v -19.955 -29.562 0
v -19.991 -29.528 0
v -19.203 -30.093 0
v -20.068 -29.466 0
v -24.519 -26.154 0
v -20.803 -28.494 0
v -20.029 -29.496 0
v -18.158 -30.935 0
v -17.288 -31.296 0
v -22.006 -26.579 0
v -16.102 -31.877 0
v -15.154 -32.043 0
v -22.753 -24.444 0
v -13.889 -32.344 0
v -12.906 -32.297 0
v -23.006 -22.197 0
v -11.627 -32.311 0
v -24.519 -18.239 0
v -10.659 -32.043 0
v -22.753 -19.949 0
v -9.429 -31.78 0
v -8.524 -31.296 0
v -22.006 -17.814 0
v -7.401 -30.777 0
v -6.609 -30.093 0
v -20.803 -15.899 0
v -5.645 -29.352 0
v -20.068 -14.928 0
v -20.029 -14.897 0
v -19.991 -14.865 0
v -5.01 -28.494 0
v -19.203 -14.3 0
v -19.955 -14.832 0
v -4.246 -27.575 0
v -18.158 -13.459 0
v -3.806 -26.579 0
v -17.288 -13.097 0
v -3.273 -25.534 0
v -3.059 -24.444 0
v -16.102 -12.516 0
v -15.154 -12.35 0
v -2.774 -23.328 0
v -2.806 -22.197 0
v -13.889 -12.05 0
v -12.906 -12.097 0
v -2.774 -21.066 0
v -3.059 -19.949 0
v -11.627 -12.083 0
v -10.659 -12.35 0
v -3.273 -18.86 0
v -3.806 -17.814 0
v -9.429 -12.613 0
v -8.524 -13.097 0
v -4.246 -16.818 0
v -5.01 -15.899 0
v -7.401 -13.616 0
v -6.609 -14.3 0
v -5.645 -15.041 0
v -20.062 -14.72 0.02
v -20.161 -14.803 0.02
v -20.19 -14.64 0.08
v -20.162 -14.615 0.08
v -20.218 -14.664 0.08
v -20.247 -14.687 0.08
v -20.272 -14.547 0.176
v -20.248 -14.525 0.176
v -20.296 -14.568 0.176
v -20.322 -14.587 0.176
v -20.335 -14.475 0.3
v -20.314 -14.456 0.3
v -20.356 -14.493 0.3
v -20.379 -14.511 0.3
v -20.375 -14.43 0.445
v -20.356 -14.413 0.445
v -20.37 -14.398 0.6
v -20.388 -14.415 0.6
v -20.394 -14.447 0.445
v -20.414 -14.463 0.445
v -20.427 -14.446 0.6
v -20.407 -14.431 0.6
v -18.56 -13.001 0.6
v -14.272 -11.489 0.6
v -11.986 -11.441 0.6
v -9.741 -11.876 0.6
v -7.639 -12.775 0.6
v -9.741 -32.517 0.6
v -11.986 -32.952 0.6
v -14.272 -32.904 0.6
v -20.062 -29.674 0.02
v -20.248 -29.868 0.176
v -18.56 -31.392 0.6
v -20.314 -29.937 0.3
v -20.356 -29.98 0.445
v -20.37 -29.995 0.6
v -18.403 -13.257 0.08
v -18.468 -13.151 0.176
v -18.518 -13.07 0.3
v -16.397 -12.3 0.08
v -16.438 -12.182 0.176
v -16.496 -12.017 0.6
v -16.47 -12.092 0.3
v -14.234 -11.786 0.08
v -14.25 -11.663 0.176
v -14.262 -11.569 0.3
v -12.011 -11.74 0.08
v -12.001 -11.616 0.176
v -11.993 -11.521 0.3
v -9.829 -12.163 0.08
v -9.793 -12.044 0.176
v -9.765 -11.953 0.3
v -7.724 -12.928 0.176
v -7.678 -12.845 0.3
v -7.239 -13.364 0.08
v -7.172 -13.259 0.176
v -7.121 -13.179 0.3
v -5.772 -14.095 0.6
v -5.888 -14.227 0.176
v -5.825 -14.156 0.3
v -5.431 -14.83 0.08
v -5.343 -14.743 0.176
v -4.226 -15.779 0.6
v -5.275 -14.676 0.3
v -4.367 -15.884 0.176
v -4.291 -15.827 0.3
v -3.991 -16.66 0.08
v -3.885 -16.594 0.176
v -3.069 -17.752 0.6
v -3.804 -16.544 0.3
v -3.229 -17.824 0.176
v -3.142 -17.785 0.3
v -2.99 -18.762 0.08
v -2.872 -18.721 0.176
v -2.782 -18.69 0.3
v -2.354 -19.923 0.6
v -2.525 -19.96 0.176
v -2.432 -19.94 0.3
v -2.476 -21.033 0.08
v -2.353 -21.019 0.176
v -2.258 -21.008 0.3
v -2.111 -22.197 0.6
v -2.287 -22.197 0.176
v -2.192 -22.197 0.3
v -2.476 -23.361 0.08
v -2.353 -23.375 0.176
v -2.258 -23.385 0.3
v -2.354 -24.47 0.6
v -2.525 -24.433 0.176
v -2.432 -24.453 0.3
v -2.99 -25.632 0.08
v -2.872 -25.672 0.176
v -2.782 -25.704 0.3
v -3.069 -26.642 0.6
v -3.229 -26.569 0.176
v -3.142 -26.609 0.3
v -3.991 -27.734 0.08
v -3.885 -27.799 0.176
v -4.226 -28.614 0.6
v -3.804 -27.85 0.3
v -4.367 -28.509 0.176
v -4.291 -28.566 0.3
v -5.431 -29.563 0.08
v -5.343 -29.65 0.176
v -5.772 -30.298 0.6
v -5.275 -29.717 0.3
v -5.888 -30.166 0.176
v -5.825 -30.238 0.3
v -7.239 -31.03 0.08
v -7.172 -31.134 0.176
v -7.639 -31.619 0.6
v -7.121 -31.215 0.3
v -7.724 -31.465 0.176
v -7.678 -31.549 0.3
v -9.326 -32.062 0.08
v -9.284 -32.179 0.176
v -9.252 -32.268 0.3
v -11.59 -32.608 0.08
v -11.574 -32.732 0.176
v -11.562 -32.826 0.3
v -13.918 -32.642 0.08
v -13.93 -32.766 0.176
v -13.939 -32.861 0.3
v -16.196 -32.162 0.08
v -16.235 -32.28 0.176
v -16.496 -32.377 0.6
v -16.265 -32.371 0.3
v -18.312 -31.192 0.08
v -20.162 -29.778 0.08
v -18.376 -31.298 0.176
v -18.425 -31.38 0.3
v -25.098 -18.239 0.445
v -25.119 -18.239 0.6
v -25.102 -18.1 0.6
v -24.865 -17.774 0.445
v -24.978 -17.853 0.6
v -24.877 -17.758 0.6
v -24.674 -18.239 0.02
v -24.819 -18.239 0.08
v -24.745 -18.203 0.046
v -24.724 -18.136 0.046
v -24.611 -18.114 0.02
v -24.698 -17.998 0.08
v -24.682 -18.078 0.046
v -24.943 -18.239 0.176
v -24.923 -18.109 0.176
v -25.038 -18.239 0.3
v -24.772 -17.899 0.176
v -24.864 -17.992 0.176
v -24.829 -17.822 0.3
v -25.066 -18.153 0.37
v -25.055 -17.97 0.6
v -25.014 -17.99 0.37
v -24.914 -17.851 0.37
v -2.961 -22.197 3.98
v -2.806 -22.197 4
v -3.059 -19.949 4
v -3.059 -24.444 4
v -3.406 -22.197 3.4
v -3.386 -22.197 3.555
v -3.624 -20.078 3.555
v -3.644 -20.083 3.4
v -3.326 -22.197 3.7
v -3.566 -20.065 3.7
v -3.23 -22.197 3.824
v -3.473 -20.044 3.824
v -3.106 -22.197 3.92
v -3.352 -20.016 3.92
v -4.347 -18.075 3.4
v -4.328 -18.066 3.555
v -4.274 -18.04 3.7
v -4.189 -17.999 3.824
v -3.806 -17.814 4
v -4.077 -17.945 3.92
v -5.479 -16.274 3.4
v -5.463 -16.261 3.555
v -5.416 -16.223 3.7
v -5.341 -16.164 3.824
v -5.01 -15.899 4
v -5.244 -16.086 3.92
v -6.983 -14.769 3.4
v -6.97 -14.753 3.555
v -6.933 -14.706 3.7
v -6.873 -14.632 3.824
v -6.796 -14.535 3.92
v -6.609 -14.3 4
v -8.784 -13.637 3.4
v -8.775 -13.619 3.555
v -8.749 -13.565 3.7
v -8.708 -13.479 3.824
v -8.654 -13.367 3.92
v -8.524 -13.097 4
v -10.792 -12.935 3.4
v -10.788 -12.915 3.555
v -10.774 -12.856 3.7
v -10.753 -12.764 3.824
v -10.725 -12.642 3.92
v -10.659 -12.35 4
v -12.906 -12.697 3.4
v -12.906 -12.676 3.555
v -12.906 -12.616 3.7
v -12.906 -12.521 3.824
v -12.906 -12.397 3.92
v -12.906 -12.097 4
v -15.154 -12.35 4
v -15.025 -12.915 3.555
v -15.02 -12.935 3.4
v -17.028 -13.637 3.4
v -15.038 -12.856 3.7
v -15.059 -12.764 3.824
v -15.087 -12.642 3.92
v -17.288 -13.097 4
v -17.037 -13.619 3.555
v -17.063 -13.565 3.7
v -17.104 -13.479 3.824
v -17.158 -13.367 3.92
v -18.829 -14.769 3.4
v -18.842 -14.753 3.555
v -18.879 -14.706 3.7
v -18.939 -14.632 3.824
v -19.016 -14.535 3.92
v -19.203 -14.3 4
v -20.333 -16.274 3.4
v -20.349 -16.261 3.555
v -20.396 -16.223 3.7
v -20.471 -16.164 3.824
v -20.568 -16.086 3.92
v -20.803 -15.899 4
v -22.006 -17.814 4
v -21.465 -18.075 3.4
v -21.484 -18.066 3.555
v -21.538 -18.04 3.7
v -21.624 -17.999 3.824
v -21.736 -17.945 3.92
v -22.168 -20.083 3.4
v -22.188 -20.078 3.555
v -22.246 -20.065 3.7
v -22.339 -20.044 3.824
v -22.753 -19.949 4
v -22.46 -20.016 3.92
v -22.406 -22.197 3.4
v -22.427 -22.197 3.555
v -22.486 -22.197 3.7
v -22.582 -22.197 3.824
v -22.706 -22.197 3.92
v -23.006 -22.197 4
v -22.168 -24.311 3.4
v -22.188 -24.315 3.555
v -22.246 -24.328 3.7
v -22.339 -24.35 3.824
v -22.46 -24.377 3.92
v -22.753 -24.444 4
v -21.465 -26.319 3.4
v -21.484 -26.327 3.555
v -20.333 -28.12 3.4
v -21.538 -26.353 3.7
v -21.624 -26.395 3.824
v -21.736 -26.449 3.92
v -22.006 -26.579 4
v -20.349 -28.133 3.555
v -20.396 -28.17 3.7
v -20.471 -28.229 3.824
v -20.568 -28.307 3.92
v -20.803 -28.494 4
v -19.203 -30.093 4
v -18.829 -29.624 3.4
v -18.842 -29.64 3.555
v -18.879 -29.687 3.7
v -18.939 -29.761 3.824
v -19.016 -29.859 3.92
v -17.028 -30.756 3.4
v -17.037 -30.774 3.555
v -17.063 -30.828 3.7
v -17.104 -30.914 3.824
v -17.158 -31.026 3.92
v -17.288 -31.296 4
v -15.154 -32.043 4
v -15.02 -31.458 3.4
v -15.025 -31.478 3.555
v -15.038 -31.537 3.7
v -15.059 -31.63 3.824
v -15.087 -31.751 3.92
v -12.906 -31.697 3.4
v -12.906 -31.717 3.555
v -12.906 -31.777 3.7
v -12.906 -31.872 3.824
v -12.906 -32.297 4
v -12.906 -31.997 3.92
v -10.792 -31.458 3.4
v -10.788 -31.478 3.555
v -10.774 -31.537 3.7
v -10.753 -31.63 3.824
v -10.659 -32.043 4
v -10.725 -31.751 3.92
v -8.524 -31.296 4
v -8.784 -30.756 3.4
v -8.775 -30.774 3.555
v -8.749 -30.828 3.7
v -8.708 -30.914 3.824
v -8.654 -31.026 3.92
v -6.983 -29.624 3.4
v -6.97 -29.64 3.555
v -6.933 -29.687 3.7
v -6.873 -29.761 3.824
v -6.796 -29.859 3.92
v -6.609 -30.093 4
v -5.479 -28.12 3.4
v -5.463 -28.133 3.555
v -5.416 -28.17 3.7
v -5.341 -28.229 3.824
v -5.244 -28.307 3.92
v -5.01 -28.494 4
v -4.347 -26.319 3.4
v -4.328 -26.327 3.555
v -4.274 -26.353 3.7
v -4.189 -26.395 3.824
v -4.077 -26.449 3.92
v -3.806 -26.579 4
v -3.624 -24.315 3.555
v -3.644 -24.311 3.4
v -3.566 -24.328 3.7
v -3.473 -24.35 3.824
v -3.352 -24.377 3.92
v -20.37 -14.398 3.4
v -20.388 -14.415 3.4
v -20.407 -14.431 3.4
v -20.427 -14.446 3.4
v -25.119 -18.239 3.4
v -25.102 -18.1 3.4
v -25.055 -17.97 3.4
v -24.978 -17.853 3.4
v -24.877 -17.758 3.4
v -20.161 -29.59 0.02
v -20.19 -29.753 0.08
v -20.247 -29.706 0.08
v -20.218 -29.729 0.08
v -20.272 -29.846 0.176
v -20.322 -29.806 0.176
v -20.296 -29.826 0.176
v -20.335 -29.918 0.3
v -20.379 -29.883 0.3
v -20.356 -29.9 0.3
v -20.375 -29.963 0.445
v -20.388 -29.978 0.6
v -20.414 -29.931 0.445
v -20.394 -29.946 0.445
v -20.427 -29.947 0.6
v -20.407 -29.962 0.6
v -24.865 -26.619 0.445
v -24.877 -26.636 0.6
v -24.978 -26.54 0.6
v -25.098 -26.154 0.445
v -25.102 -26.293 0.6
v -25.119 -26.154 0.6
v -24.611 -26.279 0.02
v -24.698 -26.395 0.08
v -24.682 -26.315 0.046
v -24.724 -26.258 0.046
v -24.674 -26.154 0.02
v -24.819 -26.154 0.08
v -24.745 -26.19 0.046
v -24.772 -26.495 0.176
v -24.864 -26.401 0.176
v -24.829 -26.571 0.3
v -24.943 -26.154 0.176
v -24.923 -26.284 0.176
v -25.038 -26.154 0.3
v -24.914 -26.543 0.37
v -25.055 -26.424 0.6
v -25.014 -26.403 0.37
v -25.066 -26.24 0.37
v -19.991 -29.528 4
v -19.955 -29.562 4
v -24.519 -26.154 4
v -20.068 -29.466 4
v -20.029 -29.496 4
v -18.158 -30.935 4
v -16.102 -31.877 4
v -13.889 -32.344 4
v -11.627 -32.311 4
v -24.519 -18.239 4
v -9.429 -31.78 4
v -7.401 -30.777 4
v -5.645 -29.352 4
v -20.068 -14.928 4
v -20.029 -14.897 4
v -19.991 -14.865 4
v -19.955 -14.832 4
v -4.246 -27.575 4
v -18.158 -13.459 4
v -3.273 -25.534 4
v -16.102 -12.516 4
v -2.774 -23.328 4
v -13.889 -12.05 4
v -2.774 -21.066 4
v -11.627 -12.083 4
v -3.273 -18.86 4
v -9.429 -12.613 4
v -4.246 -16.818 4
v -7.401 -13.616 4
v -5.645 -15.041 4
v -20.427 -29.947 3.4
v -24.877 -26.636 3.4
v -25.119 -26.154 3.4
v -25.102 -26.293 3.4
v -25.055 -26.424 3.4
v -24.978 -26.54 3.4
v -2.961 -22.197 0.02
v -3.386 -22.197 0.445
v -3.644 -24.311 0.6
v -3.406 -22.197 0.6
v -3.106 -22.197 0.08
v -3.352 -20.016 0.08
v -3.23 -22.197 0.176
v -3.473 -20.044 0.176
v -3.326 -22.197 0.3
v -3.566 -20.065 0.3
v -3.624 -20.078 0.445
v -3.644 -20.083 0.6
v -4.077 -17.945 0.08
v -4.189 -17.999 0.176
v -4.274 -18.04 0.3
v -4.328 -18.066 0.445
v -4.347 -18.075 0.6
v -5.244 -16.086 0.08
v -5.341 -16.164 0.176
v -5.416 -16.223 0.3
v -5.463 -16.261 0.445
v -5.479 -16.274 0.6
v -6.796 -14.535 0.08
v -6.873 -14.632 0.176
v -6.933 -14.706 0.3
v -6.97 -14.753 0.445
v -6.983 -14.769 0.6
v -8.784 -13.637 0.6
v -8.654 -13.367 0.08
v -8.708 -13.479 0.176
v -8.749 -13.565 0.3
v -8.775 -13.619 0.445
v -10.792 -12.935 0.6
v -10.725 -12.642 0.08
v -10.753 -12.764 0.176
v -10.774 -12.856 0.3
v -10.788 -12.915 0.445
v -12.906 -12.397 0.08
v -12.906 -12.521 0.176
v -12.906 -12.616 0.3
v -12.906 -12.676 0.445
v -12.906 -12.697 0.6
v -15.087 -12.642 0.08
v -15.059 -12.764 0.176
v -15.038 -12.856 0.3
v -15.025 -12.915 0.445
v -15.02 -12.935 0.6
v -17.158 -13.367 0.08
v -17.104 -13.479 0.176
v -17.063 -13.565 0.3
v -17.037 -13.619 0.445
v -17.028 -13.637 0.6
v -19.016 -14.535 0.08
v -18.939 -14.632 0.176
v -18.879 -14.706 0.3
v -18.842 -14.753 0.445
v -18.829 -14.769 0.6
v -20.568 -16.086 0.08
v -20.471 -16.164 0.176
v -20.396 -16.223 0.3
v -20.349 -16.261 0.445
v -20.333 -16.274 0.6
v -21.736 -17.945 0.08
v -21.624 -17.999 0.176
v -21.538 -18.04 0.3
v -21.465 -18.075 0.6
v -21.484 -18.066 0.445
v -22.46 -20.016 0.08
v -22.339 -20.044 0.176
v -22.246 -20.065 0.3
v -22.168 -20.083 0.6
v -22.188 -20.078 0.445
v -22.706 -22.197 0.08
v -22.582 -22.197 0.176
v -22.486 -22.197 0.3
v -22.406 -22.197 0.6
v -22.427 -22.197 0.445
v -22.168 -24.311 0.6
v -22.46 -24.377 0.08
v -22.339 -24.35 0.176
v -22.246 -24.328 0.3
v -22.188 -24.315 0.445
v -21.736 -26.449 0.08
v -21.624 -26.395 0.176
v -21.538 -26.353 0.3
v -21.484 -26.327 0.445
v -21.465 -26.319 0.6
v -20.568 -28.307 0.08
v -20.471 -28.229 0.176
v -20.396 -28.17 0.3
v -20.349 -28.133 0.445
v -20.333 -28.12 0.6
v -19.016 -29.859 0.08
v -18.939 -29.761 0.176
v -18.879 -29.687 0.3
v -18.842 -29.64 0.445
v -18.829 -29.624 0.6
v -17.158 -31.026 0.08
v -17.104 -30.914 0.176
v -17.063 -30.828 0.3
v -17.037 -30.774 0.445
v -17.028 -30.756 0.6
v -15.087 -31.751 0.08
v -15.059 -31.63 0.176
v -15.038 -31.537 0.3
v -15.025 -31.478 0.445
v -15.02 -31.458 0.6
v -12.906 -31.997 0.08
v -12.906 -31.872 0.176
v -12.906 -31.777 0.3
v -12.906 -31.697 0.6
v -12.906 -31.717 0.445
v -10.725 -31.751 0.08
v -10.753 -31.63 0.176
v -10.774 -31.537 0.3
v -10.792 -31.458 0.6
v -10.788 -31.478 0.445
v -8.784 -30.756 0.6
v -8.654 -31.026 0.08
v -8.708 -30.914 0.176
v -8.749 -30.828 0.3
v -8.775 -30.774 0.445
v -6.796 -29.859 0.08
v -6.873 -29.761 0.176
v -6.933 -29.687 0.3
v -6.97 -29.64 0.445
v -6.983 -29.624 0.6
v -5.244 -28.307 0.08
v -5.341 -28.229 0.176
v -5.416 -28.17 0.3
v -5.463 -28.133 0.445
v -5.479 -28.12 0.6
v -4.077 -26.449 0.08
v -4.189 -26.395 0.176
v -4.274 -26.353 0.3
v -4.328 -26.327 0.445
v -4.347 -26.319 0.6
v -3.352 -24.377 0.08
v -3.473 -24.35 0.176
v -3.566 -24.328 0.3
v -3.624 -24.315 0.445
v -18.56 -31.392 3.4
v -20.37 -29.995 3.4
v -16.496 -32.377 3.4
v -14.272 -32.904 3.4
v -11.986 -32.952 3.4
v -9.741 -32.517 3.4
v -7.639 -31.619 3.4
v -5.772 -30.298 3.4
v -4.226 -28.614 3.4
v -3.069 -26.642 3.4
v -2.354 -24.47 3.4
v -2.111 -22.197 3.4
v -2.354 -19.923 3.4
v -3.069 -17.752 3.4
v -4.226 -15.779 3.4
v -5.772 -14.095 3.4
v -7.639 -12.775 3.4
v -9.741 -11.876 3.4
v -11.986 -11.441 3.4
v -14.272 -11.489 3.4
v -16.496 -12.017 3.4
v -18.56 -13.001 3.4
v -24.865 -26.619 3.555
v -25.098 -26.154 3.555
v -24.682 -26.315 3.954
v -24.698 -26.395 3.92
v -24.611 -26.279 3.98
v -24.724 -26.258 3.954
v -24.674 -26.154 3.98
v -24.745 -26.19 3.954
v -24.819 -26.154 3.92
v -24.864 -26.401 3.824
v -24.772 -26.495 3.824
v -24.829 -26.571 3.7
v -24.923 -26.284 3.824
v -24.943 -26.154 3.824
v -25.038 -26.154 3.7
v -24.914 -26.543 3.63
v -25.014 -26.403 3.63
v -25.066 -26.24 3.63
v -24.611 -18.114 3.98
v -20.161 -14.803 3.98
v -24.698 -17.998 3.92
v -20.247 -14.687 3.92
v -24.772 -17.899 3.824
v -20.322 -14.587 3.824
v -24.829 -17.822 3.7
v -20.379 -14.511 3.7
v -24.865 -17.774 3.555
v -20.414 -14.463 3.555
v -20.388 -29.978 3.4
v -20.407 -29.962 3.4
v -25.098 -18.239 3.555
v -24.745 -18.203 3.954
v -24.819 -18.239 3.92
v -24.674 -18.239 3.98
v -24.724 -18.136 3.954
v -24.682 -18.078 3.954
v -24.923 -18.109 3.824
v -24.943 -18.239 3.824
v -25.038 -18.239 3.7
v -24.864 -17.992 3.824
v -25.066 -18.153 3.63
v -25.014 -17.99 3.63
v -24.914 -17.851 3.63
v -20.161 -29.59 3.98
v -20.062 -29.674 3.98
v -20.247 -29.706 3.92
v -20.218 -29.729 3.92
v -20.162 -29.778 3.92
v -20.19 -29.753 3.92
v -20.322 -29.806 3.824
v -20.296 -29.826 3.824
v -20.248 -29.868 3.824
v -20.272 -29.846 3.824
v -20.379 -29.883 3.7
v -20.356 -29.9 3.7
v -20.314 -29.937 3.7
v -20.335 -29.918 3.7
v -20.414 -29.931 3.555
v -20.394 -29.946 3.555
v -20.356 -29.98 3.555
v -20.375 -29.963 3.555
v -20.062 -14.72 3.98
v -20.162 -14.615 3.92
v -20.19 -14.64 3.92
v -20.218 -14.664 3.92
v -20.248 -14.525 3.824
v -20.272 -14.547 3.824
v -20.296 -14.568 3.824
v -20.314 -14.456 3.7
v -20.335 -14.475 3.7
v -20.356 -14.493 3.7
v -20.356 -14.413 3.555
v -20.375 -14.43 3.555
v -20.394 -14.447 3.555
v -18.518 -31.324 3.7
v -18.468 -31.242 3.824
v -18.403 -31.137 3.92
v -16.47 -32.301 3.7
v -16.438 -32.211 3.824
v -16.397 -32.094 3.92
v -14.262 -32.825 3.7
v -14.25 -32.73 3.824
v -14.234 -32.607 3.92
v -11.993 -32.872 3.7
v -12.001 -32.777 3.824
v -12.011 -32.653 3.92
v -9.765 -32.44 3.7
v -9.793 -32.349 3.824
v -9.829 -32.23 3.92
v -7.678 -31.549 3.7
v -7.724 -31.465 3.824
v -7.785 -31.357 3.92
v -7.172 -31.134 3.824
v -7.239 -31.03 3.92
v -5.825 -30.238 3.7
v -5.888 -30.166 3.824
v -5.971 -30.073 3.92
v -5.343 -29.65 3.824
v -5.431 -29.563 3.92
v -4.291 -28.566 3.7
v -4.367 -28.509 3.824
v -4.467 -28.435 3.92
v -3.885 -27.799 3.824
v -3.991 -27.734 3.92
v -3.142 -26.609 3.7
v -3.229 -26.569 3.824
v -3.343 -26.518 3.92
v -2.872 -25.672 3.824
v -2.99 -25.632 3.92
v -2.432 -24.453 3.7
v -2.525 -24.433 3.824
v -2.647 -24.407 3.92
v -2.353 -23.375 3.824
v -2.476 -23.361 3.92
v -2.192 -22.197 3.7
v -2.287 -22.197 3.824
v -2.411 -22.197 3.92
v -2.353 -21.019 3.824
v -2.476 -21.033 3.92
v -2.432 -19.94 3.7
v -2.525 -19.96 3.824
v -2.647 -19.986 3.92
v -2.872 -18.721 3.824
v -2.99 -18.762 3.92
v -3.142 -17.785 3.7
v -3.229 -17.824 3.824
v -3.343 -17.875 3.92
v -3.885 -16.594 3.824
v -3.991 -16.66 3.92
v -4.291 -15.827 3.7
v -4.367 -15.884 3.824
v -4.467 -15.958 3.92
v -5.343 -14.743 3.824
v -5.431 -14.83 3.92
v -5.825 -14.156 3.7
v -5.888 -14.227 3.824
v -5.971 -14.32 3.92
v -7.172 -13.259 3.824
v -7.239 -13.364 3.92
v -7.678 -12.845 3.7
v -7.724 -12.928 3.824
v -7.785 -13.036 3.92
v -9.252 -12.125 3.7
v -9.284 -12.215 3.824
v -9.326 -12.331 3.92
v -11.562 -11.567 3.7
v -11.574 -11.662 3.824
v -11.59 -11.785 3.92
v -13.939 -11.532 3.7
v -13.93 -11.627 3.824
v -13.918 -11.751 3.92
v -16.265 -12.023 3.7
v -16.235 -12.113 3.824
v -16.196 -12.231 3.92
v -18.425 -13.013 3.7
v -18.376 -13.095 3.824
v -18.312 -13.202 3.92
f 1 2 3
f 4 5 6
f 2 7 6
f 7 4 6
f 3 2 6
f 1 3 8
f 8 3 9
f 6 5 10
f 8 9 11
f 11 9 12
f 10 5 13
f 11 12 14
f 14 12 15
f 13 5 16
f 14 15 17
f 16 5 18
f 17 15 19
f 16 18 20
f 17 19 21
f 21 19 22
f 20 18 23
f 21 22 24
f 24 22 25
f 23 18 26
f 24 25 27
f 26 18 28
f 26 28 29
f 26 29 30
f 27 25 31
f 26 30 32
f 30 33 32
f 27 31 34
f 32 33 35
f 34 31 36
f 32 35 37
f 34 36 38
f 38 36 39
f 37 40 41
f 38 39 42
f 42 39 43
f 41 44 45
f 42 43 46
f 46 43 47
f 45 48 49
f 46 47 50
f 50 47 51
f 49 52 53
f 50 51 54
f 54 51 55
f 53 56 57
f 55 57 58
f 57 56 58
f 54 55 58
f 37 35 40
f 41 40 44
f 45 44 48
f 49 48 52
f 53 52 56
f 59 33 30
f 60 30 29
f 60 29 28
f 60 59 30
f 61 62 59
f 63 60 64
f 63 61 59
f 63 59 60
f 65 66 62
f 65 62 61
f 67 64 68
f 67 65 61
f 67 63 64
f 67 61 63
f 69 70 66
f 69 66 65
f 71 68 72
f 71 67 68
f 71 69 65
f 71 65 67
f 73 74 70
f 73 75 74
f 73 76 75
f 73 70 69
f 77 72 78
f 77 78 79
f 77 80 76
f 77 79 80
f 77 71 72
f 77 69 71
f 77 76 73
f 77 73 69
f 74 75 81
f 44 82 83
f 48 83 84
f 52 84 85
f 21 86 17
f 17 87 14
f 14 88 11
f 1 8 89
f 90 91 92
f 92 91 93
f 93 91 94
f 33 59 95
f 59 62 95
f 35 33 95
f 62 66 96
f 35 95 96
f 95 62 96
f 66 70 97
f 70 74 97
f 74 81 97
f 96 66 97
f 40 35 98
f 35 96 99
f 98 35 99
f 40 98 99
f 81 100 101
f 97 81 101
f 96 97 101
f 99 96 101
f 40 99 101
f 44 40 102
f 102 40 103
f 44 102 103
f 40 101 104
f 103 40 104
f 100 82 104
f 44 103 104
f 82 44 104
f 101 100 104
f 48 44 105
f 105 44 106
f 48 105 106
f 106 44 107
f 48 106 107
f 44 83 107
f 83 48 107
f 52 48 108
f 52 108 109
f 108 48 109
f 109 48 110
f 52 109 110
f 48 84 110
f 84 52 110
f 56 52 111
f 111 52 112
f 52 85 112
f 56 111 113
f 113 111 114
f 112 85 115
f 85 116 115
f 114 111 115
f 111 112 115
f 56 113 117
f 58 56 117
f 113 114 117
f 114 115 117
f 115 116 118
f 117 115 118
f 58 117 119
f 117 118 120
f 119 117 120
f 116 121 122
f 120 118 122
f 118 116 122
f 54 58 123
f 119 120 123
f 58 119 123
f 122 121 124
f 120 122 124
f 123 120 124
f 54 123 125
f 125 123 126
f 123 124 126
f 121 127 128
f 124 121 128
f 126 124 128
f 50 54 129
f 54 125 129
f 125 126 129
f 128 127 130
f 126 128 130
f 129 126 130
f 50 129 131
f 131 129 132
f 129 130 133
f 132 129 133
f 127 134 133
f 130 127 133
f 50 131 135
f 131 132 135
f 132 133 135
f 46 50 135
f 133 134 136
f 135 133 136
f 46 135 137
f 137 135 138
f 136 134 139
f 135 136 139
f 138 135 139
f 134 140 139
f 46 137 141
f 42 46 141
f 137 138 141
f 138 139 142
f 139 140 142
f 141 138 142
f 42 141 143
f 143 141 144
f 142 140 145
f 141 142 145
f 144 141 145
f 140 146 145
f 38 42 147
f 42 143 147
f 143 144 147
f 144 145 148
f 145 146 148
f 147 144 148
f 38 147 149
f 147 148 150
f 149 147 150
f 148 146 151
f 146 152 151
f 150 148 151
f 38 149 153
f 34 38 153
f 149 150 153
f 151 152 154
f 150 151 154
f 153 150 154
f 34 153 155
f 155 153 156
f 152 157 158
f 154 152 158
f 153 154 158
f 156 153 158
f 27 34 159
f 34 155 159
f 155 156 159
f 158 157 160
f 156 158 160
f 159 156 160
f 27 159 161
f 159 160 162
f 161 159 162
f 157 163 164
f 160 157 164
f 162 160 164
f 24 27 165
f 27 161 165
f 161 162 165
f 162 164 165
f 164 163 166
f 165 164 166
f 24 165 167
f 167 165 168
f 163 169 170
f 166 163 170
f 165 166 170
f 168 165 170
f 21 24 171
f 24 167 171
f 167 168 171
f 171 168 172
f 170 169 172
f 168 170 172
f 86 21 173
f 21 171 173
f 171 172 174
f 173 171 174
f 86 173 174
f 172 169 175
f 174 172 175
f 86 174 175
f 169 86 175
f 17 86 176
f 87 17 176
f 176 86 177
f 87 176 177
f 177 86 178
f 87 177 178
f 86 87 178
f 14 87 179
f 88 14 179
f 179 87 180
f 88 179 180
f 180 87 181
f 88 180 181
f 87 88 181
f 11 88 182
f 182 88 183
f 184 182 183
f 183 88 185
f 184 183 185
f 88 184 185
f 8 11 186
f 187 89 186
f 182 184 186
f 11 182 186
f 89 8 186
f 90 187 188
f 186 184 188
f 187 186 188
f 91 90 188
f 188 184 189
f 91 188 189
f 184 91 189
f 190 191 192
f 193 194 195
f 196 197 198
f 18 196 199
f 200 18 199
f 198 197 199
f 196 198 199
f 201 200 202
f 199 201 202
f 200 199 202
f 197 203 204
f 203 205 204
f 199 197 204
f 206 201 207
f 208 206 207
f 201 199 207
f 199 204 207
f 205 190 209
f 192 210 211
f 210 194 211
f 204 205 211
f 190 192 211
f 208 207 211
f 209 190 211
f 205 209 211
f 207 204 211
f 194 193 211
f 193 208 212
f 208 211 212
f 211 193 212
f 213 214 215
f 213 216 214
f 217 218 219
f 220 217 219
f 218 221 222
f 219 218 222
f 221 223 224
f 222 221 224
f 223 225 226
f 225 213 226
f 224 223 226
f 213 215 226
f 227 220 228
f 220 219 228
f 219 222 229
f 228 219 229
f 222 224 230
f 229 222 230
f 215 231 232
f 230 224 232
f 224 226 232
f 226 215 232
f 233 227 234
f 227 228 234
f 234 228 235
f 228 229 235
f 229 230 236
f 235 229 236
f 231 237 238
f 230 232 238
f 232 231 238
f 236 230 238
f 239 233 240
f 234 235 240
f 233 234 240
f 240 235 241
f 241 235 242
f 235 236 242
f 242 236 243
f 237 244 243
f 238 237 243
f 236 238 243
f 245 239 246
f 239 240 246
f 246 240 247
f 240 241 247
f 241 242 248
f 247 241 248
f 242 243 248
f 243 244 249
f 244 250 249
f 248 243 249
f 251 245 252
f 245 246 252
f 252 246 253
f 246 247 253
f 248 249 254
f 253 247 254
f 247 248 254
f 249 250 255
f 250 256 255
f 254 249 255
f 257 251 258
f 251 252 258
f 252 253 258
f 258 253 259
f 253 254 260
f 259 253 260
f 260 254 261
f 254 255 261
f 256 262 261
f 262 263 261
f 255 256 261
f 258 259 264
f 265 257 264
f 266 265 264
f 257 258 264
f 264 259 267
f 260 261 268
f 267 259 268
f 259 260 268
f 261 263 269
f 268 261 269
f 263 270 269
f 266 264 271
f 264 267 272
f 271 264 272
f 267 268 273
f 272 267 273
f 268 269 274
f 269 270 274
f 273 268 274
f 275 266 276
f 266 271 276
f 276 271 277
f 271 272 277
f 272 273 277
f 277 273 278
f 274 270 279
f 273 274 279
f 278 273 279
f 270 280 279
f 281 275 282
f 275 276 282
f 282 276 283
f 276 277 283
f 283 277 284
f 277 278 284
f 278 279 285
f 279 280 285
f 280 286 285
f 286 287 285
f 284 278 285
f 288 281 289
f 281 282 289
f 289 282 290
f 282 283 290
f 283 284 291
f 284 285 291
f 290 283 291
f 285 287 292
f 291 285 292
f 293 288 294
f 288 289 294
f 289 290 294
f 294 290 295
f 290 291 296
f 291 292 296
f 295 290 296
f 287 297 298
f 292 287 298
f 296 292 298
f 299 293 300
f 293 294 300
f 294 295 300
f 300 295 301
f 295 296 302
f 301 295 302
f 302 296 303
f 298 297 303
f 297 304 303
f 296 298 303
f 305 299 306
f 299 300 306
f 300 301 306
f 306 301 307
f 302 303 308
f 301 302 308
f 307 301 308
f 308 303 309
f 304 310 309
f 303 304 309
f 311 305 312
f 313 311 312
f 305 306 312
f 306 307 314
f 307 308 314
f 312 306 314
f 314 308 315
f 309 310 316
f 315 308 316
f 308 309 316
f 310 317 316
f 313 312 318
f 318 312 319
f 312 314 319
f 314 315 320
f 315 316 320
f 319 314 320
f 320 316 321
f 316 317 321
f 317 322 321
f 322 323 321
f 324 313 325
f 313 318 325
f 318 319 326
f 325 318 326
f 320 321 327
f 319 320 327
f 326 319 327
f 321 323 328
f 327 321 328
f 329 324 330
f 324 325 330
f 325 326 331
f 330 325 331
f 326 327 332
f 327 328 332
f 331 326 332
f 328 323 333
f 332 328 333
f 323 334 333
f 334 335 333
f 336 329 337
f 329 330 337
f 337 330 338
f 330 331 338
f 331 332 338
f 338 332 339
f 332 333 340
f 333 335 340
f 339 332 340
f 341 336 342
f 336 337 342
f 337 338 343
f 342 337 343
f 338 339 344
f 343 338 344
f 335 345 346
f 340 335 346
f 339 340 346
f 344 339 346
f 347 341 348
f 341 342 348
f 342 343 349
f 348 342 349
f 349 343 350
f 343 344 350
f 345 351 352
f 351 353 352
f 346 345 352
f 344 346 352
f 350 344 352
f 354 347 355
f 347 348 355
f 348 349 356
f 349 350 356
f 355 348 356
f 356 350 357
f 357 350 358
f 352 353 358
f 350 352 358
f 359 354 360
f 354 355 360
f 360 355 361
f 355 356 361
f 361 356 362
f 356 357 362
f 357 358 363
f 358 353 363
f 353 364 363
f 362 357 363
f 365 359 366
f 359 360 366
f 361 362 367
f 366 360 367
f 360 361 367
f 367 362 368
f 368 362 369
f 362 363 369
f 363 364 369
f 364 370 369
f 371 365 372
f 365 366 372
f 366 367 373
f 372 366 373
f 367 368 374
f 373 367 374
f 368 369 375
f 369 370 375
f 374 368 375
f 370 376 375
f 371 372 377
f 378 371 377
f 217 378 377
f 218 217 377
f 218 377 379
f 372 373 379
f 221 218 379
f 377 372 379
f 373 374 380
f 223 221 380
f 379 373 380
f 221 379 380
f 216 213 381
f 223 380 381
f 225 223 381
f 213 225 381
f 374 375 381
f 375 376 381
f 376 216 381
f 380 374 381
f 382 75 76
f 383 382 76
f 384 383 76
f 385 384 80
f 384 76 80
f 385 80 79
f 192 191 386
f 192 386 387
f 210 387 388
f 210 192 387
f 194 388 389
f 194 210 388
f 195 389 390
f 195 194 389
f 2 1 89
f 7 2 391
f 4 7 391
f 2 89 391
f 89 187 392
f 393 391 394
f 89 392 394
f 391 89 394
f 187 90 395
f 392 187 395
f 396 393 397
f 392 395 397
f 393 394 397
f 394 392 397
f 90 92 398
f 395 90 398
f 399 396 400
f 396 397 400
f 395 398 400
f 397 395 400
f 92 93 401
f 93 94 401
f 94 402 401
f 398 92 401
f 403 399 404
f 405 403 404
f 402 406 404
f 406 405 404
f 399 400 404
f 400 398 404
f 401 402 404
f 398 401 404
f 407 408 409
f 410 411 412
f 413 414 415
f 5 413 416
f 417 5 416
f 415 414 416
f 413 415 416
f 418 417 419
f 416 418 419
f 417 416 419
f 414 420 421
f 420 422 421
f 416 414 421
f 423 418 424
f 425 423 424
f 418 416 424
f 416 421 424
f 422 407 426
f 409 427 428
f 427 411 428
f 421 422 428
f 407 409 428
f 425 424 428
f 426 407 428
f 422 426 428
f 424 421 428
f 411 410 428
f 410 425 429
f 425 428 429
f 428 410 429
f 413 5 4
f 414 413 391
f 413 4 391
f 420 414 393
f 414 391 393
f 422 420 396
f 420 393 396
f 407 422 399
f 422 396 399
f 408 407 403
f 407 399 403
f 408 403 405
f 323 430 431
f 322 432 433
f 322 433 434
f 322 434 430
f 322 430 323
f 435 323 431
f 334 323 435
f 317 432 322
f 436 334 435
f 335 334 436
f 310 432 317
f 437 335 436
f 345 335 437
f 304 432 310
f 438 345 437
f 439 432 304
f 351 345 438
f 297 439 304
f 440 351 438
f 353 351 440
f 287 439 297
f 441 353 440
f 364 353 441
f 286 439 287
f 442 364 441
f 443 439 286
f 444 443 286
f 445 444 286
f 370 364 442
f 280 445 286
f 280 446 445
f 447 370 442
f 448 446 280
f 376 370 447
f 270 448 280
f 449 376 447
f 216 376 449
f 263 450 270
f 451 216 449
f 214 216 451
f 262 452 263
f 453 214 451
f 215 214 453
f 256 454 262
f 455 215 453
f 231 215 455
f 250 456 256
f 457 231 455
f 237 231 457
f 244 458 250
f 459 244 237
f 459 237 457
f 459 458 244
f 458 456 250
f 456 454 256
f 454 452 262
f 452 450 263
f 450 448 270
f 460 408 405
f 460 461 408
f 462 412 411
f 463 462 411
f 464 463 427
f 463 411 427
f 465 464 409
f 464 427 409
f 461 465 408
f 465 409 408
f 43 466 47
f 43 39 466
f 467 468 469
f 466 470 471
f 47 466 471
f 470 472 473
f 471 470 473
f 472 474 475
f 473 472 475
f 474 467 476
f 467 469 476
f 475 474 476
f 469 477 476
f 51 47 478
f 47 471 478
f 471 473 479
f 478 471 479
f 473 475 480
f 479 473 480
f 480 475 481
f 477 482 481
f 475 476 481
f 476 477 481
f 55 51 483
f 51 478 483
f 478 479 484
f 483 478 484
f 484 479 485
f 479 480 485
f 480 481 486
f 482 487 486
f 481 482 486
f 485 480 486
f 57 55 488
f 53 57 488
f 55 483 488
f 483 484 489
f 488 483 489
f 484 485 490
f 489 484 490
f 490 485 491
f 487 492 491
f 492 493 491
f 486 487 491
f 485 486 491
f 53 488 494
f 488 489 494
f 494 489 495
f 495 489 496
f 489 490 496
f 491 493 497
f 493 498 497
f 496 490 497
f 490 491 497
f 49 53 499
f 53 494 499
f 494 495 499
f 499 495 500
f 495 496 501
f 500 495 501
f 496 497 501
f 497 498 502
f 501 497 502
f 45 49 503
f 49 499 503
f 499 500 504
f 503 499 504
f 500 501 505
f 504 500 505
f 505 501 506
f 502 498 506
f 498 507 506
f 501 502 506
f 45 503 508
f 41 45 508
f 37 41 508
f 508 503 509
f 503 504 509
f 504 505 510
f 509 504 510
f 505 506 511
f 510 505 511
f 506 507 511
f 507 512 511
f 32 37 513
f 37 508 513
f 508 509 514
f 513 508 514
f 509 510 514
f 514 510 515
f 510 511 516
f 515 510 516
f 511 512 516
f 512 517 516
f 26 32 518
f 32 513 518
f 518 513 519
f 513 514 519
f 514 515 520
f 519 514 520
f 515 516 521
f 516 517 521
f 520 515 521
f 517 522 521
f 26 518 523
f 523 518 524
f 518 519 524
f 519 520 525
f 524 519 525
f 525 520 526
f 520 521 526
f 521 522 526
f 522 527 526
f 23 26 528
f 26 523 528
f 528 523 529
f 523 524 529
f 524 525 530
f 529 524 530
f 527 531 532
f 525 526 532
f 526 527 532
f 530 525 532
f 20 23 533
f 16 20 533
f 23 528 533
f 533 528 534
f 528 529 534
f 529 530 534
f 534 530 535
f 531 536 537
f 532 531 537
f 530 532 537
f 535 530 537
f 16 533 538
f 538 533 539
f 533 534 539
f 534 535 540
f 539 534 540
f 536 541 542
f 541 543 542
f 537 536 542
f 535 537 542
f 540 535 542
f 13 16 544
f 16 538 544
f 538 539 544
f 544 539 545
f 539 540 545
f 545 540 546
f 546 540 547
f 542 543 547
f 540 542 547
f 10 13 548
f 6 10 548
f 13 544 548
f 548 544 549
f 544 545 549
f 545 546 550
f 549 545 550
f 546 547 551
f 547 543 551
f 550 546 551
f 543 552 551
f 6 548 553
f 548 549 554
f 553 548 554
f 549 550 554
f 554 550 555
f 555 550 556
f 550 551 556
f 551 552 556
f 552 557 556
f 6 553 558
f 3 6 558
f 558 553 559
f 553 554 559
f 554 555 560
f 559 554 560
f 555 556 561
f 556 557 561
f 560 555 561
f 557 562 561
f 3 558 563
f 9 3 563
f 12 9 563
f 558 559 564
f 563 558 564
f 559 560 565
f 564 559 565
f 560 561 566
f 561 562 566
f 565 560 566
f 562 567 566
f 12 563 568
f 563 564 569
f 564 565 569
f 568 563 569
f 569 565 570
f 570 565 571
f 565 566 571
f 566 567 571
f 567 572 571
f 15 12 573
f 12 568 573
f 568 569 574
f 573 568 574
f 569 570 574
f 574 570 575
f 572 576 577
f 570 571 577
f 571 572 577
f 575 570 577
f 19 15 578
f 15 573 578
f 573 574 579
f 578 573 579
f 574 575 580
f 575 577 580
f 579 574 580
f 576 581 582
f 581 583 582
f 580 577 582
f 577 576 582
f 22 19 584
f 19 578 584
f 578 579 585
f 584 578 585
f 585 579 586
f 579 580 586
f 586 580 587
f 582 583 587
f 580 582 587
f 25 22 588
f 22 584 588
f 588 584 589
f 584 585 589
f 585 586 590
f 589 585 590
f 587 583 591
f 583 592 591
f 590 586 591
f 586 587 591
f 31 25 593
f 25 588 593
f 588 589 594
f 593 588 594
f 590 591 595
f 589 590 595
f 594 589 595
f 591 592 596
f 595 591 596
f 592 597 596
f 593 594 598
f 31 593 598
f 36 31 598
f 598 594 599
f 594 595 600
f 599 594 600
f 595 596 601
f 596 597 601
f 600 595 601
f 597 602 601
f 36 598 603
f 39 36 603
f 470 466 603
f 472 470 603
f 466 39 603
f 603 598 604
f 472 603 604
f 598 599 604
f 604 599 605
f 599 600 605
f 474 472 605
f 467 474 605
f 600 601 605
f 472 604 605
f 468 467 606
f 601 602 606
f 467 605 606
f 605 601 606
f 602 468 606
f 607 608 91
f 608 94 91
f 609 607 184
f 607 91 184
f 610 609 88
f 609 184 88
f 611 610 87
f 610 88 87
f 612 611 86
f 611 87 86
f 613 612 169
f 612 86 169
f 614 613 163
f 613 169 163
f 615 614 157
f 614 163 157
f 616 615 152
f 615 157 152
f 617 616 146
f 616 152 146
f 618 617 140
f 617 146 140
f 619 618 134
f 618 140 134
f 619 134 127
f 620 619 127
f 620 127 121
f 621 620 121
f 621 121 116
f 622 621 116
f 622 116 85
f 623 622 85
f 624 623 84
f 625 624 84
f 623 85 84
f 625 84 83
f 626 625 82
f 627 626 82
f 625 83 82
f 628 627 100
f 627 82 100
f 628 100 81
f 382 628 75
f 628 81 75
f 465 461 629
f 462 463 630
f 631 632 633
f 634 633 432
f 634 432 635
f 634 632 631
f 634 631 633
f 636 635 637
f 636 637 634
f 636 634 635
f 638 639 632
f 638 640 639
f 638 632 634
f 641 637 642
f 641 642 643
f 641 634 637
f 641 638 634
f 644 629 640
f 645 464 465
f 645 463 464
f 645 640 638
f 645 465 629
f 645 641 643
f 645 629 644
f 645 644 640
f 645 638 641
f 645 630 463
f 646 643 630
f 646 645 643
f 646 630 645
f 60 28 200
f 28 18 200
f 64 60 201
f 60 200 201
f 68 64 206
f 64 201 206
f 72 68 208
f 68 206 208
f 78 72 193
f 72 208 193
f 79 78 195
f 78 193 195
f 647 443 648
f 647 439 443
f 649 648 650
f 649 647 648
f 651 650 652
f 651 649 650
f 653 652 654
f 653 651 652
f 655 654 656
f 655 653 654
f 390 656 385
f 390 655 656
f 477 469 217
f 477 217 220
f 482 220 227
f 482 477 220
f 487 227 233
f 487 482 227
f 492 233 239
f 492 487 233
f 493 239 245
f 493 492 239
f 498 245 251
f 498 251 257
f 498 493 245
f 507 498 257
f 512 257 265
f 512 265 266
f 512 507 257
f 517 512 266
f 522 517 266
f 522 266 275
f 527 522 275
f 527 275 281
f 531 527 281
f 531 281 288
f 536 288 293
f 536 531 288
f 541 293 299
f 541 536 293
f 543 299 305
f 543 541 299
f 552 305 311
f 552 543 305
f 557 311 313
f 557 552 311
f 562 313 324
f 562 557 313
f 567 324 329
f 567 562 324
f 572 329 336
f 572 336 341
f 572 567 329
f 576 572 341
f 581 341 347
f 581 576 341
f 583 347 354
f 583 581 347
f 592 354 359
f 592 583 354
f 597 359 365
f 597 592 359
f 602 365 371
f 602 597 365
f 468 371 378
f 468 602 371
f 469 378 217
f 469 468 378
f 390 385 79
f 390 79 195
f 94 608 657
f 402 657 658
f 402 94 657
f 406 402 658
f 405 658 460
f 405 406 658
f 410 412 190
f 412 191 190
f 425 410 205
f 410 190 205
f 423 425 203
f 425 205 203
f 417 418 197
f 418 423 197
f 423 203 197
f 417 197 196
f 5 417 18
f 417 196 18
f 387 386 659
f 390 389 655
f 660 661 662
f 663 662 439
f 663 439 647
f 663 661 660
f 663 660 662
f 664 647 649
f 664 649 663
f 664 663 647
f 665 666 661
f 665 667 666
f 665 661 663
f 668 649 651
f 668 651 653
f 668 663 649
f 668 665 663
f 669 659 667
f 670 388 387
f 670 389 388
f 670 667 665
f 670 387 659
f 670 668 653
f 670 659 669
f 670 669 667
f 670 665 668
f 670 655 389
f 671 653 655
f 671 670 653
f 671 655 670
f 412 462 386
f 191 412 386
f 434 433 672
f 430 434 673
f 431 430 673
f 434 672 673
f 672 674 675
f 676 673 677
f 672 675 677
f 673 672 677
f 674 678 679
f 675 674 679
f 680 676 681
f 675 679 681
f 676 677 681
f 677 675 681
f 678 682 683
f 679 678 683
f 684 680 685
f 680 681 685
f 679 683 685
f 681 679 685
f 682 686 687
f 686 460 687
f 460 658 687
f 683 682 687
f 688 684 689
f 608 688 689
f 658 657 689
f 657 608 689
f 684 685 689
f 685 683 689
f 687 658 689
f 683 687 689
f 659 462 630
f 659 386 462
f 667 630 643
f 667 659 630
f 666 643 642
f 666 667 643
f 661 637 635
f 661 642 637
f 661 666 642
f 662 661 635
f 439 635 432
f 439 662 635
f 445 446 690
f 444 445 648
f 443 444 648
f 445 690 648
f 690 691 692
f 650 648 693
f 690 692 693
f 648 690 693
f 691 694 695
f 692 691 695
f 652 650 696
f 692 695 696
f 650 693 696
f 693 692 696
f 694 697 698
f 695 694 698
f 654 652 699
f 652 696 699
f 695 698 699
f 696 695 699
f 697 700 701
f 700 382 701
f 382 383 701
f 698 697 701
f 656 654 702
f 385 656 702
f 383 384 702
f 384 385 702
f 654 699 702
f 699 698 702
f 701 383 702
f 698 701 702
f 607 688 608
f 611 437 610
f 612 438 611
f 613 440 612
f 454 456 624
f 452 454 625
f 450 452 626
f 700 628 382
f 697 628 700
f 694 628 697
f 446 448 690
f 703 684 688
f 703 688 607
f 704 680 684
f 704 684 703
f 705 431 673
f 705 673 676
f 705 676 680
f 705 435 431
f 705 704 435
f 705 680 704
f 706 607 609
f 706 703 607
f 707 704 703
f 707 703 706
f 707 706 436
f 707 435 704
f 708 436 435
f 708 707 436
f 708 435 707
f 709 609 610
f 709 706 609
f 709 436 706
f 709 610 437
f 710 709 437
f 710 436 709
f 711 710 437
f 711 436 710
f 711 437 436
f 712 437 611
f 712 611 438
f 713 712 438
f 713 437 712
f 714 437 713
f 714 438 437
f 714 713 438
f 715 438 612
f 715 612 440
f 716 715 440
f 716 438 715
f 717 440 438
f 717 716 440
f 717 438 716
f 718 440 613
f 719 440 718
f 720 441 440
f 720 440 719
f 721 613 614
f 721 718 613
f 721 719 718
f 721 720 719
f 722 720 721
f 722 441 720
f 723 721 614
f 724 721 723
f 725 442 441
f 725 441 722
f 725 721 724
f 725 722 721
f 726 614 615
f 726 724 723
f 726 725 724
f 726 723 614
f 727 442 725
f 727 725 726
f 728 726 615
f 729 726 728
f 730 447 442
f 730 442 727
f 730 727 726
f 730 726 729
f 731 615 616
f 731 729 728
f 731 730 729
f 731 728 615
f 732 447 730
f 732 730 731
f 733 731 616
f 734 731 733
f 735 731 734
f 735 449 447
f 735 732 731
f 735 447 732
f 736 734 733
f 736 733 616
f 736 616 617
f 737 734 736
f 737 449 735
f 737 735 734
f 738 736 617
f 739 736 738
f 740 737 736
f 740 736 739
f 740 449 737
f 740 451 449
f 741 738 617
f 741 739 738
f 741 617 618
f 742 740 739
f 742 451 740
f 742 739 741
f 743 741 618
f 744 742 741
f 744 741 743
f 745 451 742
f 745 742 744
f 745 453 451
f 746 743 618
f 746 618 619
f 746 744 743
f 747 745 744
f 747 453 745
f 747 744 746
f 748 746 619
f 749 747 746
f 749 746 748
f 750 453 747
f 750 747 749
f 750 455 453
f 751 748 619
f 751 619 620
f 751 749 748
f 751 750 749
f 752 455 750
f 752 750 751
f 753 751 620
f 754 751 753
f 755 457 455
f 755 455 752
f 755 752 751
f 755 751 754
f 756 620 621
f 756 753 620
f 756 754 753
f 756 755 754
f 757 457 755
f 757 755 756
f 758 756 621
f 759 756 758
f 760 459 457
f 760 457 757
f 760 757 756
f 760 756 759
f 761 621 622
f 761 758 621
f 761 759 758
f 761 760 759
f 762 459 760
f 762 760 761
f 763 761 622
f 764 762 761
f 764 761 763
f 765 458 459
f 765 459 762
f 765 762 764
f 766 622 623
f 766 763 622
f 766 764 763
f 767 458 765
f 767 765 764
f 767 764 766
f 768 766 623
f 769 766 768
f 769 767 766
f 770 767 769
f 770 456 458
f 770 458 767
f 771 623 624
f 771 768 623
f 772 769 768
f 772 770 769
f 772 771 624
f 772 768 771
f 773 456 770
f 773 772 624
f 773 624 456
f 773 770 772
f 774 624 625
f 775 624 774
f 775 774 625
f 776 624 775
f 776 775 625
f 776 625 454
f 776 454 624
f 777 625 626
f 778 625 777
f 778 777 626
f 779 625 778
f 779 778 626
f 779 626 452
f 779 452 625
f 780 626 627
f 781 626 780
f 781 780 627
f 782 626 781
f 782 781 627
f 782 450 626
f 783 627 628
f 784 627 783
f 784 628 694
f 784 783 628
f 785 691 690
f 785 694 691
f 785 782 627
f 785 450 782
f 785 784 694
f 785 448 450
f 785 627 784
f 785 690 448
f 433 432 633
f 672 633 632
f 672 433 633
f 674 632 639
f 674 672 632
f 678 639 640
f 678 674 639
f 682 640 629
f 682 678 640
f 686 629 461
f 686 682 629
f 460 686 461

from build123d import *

# Parameters (mm, degrees)
F0_R     = 10.7945636434
F0_R_2   = 9.5
F1_DEPTH = 4
F2_W     = 2.2937387829
F2_H     = 8.5183947237
F3_DEPTH = 4
F4_R     = 0.6


with BuildPart() as f1:
    # F0 (on Top) → F1 (new body)
    with BuildSketch(Plane.XY):
        with Locations((-12.9060586914, -22.1966579556)):
            Circle(F0_R)
        with Locations((-12.9060586914, -22.1966579556)):
            Circle(F0_R_2, mode=Mode.SUBTRACT)
    extrude(amount=F1_DEPTH)

    # F2 (on face) → F3 (join)
    with BuildSketch(Plane.XY.offset(4)):
        with Locations((-23.9716902075, -22.1966579556)):
            Rectangle(F2_W, F2_H)
        Polygon((-25.1185595989, -17.9374605938), (-22.824820816, -17.9374605938), (-18.1995894648, -12.7891537062), align=None)
        Polygon((-18.1995894648, -31.6041622051), (-22.824820816, -26.4558553175), (-25.1185595989, -26.4558553175), align=None)
    extrude(amount=-F3_DEPTH)

    # F4
    f4_edges = [f1.edges().sort_by_distance(p)[0] for p in [
        (-2.111495, -22.196658, 4),
        (-2.111495, -22.196658, 0),
        (-22.75742, -28.212746, 0),
        (-25.11856, -22.196658, 4),
        (-22.75742, -16.18057, 4),
        (-25.11856, -22.196658, 0),
        (-22.75742, -16.18057, 0),
        (-22.406059, -22.196658, 4),
        (-22.406059, -22.196658, 0),
        (-25.11856, -26.455855, 2),
        (-25.11856, -17.937461, 2),
        (-20.39628, -14.42368, 2),
        (-20.39628, -29.969636, 2),
        (-22.75742, -28.212746, 4),
    ]]
    fillet(f4_edges, radius=F4_R)


solid = f1.part
